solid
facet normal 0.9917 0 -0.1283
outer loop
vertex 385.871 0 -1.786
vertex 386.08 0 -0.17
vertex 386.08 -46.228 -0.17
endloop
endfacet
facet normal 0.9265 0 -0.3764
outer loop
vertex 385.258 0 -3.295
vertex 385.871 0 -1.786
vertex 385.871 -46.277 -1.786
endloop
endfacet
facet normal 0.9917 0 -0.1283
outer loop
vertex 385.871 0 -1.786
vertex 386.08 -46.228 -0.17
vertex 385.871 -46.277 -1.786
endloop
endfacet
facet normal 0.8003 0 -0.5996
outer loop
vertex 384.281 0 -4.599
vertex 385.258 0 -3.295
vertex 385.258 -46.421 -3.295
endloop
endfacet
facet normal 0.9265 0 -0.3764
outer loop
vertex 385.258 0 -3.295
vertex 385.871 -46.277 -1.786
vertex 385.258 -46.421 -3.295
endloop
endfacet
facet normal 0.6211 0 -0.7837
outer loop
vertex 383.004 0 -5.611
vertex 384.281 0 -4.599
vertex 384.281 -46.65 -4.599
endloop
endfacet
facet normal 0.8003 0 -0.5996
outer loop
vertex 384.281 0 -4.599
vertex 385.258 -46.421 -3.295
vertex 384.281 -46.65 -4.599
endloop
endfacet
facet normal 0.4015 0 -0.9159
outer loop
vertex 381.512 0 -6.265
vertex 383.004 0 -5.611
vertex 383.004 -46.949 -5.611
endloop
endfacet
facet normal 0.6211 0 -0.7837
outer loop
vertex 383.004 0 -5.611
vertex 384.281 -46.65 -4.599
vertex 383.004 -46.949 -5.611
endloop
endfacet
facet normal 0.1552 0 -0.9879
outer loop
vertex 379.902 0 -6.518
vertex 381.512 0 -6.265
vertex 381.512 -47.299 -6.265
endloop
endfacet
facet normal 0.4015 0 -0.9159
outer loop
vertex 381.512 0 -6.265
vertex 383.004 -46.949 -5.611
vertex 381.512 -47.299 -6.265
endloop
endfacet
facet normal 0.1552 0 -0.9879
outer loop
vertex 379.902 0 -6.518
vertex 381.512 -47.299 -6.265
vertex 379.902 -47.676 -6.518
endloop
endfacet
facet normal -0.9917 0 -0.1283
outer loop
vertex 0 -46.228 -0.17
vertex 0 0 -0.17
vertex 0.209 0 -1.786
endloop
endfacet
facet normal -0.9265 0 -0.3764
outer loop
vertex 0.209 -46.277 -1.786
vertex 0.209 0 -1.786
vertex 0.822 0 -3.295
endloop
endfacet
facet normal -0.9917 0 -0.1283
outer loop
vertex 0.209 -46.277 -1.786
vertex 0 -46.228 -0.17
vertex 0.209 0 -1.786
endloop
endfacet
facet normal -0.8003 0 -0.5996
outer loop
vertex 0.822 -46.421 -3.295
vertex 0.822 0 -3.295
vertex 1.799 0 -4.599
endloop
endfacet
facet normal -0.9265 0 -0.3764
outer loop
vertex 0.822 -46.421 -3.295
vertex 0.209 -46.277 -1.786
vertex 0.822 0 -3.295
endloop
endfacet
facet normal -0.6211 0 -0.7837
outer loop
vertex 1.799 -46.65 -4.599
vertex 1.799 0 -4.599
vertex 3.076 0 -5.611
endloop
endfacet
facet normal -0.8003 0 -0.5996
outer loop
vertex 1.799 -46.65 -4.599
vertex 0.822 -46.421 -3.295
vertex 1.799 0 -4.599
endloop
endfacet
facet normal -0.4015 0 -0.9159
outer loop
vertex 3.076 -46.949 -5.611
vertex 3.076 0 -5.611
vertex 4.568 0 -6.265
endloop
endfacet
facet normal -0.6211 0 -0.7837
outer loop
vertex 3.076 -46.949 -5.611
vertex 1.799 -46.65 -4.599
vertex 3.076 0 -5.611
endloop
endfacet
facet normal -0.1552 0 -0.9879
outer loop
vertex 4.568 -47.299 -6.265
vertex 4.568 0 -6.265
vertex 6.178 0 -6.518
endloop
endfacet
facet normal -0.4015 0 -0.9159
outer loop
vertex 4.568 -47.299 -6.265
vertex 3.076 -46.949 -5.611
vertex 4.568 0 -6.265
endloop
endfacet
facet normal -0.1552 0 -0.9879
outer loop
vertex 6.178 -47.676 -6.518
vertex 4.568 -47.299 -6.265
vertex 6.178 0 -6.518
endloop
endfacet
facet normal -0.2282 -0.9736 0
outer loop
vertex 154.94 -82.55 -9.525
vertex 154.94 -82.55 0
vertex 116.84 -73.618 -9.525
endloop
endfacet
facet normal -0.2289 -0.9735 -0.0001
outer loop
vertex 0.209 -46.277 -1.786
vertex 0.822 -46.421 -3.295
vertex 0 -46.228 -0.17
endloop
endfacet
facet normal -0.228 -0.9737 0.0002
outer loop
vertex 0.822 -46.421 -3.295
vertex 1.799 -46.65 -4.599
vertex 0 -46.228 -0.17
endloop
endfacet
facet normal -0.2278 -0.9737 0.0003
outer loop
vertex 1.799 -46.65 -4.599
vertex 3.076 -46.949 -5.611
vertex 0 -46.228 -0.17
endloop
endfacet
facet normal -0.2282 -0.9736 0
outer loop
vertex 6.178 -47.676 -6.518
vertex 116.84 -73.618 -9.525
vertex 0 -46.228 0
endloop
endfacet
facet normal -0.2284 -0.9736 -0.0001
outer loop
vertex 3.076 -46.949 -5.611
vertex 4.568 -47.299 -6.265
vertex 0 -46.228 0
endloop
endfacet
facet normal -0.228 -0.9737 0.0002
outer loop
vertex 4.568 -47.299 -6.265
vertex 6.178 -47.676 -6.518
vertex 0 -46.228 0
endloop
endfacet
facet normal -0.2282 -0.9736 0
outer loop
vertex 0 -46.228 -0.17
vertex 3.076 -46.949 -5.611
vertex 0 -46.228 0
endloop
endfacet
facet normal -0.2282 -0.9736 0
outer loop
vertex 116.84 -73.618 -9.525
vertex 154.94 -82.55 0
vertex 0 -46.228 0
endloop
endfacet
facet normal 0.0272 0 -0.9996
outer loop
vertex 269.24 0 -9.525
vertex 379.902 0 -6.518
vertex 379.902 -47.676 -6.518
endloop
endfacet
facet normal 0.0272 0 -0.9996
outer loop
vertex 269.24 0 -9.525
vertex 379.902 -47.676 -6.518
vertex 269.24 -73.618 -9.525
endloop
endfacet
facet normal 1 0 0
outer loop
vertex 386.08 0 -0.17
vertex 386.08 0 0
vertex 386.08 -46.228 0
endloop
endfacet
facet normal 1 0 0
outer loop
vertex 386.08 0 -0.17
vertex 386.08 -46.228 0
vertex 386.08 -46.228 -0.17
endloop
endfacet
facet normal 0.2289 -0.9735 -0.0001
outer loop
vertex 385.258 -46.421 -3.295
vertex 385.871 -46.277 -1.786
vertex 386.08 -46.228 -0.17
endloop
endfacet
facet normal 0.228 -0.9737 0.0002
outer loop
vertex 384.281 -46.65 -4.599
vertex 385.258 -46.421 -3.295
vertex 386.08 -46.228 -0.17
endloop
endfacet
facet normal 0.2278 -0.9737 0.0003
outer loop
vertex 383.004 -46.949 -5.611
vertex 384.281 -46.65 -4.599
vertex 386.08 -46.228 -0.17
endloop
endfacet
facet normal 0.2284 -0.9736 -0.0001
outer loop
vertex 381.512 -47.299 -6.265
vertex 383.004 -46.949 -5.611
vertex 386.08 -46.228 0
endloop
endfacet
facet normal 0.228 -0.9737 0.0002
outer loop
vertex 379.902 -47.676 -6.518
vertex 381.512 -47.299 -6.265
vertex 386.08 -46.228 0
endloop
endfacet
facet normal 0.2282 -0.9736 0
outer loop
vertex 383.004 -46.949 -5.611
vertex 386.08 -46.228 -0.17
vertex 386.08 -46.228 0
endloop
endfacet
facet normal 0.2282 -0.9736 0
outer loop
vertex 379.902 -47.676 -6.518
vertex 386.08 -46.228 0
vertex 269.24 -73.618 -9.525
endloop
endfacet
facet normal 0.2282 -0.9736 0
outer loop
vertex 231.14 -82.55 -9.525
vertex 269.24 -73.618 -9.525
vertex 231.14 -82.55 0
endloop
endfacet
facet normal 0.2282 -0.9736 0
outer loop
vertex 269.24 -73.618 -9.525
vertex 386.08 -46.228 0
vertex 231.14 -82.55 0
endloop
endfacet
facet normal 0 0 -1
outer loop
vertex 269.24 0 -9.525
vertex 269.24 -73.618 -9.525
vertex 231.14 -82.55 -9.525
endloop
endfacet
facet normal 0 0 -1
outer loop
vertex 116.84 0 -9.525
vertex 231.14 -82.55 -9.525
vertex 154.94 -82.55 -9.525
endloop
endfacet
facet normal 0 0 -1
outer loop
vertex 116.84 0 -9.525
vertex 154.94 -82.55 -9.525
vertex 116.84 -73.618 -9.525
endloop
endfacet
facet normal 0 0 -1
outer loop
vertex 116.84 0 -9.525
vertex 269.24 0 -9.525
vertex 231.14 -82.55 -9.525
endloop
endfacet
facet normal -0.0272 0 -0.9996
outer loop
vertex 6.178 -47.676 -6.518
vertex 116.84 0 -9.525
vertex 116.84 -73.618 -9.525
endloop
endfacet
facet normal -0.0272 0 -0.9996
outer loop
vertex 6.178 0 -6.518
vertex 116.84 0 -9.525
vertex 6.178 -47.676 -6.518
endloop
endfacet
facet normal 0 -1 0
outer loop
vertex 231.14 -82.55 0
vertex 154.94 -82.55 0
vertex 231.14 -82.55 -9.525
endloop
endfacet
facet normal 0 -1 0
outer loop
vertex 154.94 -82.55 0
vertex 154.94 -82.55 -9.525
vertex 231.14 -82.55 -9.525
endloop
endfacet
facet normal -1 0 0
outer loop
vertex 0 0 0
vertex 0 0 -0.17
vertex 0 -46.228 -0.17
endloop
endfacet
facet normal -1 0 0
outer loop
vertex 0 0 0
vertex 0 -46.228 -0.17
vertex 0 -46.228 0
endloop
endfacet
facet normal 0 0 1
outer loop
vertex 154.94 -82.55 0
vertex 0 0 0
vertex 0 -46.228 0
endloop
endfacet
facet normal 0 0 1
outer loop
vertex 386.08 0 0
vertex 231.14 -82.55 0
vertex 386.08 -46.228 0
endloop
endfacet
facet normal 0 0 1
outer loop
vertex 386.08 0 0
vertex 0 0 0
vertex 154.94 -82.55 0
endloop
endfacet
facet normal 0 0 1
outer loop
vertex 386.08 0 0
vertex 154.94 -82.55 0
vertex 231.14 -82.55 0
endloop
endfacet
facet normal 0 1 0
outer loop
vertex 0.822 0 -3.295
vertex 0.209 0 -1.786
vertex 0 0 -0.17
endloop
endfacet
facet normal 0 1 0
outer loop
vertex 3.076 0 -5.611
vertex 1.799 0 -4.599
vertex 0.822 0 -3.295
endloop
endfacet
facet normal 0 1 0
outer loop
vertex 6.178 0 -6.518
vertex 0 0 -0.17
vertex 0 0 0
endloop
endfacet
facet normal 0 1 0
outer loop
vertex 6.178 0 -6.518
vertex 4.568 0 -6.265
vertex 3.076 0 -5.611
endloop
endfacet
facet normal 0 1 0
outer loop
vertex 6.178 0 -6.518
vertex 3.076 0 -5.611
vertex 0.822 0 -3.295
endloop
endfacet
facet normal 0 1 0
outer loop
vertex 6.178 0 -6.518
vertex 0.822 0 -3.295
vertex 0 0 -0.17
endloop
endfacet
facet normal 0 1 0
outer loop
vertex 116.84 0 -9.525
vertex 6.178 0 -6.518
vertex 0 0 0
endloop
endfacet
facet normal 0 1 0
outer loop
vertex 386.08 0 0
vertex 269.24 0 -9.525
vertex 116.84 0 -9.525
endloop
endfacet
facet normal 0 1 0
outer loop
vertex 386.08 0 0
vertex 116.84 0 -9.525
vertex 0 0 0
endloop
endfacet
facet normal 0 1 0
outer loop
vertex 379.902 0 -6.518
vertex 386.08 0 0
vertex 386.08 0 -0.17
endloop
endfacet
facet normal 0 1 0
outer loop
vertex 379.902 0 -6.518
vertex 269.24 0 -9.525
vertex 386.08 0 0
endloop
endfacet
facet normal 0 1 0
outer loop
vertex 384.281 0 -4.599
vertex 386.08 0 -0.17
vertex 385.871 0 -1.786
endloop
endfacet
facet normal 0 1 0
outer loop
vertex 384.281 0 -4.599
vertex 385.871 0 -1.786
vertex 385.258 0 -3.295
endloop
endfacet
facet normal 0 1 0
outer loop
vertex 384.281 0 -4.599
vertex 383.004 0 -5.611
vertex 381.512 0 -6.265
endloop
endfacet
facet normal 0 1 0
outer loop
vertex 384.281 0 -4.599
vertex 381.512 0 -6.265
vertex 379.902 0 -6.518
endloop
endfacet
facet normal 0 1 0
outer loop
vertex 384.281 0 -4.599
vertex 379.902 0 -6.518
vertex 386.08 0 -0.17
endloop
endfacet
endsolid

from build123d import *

# Parameters (mm, degrees)
BOSS_EXTRUDE1_DEPTH = 82.55
SKETCH1_OUTSIDE_W   = 467.064
SKETCH1_OUTSIDE_H   = 163.534
CUT_EXTRUDE1_DEPTH  = 395.921504257
FILLET2_R           = 6.35
FILLET3_R           = 6.35


with BuildPart() as part:
    # Sketch2 → Boss-Extrude1 (new body)
    with BuildSketch(Plane(origin=(0, 0, 0), x_dir=(1, 0, 0), z_dir=(0, 1, 0))):
        Polygon((193.04, 9.525), (193.04, 0), (386.08, 0), (386.08, 6.35), (269.24, 9.525), align=None)
        Polygon((0, 6.35), (0, 0), (193.04, 0), (193.04, 9.525), (116.84, 9.525), align=None)
    extrude(amount=-BOSS_EXTRUDE1_DEPTH)

    # Sketch1 outside → Cut-Extrude1 (cut, through all)
    with BuildSketch(Plane.XY):
        with Locations((193.04, -41.275)):
            Rectangle(SKETCH1_OUTSIDE_W, SKETCH1_OUTSIDE_H)
        Polygon((0, 0), (386.08, 0), (386.08, -46.228), (231.14, -82.55), (154.94, -82.55), (0, -46.228), align=None, mode=Mode.SUBTRACT)
    extrude(amount=-CUT_EXTRUDE1_DEPTH, mode=Mode.SUBTRACT)

    # Fillet2
    fillet2_edges = [part.edges().sort_by_distance(p)[0] for p in [
        (386.08, -23.114, -6.35),
    ]]
    fillet(fillet2_edges, radius=FILLET2_R)

    # Fillet3
    fillet3_edges = [part.edges().sort_by_distance(p)[0] for p in [
        (0, -23.114, -6.35),
    ]]
    fillet(fillet3_edges, radius=FILLET3_R)


solid = part.part
